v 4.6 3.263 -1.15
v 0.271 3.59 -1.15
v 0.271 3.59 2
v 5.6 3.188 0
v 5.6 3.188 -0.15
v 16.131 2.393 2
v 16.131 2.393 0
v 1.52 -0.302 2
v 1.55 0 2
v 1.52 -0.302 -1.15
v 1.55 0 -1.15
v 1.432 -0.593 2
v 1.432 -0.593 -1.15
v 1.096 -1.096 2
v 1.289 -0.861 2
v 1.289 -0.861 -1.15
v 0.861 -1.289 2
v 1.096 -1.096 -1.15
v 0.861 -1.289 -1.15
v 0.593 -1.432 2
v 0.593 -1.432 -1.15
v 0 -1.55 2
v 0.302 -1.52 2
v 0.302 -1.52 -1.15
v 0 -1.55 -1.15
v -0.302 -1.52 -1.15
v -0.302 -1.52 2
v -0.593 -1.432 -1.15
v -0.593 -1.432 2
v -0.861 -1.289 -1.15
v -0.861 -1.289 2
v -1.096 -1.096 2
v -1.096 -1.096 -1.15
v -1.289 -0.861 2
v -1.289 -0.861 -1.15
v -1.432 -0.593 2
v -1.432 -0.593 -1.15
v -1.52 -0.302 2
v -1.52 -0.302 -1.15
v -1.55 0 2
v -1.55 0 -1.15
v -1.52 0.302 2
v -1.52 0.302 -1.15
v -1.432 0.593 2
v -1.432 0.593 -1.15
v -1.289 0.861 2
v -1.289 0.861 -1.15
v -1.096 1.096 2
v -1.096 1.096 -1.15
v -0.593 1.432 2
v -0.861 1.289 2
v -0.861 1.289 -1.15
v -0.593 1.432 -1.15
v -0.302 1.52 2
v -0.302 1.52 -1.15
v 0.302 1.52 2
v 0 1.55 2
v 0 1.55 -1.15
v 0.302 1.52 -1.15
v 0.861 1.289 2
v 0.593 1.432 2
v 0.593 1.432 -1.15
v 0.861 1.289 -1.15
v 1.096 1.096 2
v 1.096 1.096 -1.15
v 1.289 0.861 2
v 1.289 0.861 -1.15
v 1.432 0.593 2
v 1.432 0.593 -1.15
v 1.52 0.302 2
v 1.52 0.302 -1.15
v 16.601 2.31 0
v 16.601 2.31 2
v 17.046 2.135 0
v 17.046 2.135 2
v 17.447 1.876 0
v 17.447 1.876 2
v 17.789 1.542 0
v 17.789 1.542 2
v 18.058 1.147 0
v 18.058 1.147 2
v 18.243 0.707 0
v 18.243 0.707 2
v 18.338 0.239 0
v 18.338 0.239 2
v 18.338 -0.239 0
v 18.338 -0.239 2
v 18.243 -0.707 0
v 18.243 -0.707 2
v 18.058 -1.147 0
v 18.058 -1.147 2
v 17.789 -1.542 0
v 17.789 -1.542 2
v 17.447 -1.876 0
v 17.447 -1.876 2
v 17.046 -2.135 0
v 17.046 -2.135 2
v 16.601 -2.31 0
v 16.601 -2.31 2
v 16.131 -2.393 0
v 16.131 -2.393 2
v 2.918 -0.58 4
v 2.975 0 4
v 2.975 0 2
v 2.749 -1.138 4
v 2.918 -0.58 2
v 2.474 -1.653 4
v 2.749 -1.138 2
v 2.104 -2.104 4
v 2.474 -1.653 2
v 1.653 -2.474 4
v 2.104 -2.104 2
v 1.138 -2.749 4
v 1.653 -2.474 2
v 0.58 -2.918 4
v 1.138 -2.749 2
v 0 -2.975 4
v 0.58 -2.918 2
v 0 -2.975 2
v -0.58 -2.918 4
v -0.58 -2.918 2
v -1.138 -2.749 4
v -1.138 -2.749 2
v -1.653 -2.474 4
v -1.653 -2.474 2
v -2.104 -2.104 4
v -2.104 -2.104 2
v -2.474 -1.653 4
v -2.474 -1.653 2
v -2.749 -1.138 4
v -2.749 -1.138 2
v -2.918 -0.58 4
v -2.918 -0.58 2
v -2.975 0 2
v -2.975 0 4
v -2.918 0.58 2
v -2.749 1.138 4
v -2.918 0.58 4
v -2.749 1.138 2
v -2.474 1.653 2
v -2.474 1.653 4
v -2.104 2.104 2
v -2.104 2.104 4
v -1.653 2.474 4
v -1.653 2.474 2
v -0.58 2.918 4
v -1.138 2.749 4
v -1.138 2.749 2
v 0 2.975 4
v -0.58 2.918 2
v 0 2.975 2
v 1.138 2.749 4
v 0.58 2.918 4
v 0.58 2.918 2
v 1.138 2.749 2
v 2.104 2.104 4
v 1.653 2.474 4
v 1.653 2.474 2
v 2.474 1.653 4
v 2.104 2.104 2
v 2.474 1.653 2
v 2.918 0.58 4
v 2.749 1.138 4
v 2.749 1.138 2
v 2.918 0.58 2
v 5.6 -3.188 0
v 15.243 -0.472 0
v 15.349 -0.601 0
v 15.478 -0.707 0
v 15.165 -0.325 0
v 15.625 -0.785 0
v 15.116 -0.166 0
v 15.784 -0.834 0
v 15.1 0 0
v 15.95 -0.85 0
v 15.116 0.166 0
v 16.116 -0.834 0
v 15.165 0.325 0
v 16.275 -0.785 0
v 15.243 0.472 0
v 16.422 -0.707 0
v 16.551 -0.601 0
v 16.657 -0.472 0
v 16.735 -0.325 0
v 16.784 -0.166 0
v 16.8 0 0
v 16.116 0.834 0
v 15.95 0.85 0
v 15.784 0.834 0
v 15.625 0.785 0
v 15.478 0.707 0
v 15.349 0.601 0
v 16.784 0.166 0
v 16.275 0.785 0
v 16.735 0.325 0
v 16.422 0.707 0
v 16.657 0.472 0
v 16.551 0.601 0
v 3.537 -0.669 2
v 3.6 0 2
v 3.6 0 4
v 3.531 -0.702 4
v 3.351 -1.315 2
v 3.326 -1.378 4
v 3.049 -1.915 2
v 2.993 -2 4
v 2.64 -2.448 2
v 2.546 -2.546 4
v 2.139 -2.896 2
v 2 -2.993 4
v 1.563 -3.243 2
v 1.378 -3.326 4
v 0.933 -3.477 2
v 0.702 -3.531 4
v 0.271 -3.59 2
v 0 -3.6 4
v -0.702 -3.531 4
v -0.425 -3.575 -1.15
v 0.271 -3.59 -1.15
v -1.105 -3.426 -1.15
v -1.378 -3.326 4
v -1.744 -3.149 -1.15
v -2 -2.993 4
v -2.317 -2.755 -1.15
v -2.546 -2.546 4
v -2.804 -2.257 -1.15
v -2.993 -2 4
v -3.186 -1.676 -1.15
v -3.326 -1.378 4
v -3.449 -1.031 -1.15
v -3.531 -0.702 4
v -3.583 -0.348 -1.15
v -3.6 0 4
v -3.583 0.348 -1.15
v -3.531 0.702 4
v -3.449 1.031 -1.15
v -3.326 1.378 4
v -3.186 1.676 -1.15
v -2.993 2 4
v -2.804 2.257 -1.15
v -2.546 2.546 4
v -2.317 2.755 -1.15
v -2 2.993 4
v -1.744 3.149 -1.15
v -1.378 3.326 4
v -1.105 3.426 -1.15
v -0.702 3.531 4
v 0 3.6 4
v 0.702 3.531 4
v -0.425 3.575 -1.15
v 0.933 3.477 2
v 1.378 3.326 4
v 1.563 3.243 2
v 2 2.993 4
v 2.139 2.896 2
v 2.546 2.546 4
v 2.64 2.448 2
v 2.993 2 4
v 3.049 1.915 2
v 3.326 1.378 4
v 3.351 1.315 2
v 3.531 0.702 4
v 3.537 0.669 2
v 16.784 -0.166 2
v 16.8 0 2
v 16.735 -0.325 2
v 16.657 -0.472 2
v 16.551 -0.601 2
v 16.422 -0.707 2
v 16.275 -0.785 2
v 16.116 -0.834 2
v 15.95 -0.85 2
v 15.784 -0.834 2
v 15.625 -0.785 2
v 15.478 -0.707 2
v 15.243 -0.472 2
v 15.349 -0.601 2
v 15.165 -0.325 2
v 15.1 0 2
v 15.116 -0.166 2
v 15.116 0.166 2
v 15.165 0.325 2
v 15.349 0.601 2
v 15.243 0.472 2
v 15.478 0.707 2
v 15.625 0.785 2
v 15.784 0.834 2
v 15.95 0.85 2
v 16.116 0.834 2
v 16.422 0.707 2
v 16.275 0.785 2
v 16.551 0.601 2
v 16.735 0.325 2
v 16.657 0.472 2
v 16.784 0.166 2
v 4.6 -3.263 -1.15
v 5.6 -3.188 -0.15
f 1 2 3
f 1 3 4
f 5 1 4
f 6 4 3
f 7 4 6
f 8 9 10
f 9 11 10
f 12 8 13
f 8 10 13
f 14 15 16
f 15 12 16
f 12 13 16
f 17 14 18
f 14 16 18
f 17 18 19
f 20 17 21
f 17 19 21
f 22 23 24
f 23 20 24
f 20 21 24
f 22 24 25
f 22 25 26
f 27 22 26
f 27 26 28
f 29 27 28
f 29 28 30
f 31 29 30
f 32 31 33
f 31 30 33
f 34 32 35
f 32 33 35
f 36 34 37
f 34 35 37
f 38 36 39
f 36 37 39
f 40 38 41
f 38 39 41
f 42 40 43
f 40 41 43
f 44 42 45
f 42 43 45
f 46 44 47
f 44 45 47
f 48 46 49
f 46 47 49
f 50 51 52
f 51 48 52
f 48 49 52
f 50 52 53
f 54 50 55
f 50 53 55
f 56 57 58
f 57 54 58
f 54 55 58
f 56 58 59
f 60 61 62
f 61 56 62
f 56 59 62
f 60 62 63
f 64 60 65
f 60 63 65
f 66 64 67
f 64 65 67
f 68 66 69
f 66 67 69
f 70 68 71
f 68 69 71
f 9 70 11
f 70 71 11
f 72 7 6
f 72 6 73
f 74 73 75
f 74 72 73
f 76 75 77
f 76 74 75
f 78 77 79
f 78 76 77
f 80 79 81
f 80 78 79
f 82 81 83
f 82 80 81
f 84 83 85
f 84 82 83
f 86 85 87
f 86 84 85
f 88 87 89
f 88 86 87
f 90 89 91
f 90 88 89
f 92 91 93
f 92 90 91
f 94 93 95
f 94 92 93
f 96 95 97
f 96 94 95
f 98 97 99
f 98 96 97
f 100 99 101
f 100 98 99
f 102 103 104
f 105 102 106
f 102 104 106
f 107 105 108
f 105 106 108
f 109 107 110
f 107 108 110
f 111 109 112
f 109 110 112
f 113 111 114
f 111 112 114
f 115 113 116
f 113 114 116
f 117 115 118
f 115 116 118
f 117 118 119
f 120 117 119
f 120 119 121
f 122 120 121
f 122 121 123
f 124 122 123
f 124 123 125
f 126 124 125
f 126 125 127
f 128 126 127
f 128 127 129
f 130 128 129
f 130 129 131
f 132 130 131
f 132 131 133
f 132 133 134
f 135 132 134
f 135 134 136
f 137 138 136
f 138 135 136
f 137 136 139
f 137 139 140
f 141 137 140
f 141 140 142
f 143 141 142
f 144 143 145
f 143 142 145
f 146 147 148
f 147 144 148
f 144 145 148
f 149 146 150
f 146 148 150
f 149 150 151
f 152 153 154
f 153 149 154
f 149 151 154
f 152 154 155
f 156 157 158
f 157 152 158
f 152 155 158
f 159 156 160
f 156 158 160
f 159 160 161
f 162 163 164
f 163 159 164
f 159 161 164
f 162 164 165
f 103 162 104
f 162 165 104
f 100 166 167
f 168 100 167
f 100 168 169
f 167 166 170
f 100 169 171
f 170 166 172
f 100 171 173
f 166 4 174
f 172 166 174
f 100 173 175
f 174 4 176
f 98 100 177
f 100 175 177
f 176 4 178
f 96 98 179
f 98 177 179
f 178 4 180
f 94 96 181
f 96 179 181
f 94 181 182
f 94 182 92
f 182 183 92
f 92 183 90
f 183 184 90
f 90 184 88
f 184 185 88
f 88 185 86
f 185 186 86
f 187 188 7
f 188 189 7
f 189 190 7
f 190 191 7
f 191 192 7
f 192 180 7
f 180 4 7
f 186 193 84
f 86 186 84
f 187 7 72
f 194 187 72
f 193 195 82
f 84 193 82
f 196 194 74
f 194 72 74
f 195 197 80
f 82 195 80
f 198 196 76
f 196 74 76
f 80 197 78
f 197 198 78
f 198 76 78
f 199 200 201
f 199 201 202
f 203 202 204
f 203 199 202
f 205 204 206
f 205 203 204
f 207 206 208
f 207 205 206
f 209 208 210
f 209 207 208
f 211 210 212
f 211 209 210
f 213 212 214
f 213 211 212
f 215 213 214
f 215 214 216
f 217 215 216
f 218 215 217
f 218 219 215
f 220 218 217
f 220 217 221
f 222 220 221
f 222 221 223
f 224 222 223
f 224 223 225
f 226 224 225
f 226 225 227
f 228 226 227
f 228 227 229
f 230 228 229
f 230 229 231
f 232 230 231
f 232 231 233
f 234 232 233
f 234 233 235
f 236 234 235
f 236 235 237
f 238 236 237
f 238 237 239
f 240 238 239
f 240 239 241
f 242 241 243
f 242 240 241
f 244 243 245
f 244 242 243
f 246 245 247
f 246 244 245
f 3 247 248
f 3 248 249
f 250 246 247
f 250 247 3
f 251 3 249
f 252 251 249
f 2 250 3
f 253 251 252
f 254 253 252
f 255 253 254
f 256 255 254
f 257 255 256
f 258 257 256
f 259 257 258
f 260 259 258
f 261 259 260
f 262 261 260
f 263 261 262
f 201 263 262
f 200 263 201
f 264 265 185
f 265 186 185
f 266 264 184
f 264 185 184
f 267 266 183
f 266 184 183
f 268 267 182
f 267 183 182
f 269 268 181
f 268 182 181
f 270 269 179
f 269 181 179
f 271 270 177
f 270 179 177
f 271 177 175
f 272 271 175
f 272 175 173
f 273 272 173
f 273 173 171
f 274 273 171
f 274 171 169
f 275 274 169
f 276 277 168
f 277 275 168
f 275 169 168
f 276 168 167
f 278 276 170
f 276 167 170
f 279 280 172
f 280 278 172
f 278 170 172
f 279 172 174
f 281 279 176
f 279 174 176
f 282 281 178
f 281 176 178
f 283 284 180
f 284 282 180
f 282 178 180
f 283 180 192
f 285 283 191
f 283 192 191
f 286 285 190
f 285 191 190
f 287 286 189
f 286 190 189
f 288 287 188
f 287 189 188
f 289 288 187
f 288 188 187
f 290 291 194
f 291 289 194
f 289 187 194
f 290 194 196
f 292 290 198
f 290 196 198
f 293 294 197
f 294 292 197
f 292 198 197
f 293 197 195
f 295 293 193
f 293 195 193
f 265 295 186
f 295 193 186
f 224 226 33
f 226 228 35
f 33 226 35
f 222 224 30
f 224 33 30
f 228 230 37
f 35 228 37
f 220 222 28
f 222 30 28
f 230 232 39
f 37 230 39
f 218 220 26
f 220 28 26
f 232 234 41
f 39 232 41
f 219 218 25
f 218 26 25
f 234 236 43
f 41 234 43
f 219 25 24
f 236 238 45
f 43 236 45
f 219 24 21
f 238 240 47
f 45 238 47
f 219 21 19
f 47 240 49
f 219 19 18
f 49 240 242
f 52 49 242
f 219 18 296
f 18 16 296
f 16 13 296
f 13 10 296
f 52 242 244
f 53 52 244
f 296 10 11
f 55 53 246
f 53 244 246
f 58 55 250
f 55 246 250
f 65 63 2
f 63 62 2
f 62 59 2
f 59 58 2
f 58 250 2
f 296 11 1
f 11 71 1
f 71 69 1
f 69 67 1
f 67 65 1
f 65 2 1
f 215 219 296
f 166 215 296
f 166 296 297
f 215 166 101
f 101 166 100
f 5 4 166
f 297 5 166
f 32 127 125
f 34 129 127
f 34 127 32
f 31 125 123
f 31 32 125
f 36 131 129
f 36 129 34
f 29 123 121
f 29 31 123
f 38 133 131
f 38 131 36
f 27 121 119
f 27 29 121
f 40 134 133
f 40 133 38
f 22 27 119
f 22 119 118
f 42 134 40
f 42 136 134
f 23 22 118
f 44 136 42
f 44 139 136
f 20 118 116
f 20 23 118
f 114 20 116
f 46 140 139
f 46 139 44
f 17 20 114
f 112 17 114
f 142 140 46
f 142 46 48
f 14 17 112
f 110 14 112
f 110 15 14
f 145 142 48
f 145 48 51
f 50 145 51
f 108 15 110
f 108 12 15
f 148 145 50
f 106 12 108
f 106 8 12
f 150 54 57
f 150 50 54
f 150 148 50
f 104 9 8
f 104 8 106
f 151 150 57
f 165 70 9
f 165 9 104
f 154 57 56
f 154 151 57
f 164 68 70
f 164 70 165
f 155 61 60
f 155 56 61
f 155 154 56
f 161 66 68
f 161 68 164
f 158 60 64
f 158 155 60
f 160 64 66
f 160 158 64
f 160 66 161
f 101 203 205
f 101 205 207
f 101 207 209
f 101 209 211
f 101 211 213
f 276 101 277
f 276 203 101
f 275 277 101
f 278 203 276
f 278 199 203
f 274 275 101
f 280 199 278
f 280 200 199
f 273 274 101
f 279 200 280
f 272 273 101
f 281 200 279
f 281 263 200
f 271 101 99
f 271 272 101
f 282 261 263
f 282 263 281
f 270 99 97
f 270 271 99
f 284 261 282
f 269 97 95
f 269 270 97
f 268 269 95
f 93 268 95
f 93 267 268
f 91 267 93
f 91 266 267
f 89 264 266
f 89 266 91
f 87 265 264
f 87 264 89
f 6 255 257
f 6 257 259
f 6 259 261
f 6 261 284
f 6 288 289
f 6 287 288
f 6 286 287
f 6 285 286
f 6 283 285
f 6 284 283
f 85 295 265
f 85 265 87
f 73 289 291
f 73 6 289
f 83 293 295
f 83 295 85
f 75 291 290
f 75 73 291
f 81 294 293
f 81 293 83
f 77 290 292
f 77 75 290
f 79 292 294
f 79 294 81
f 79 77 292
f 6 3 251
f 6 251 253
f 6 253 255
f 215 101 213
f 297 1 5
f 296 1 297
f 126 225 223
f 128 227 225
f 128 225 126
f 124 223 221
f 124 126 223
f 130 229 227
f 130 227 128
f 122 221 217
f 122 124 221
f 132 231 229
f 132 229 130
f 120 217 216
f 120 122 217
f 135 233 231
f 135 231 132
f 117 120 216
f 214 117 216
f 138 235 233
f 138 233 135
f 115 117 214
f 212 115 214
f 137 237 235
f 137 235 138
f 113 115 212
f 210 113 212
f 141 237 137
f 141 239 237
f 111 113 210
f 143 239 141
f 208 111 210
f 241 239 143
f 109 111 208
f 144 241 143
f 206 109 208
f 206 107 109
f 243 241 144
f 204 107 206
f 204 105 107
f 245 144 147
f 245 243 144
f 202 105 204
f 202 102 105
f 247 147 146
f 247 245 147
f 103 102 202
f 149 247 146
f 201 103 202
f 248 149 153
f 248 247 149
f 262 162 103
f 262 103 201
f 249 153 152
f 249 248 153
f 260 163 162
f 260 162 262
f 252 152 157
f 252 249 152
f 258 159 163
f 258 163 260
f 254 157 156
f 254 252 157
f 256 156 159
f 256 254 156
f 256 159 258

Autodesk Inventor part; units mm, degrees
ref_plane "YZ Plane" through (0, 0, 0) normal (1, 0, 0) x (0, 1, 0)
ref_plane "XZ Plane" through (0, 0, 0) normal (0, 1, 0) x (-1, 0, 0)
ref_plane "XY Plane" through (0, 0, 0) normal (0, 0, 1) x (1, 0, 0)
sketch "Sketch1" plane through (0, 0, 0) normal (0, 0, 1) x (1, 0, 0)
  circle A0 centre (0, 0) radius 3.6
  line L0 (0, 0) -> (15.95, 0) construction
  circle A1 centre (15.95, 0) radius 2.4
  line L1 (0.2708, 3.5898) -> (16.1306, 2.3932)
  line L2 (0.2708, -3.5898) -> (16.1306, -2.3932)
  line L3 (5.6, 3.1877) -> (5.6, -3.1877)
  line L4 (0, 0) -> (-3.6, 0) construction
  circle A2 centre (0, 0) radius 1.55
  circle A3 centre (15.95, 0) radius 0.85
  circle A4 centre (0, 0) radius 2.975
  dimension "d0" = 7.2
  dimension "d1" = 4.8
  dimension "d2" = 15.95
  dimension "d5" = 9.2
  dimension "d6" = 3.1
  dimension "d7" = 1.7
  dimension "d10" = 5.95
extrude "Extrusion1" add sketch "Sketch1" along normal blind 2 contours A0 | A0 L1 L3 L2 | L1 A1 L2 L3 | A1 | A4
extrude "Extrusion2" add sketch "Sketch1" against normal blind 1.15 contours A0 | A0 L1 L3 L2 | A4
extrude "Extrusion3" add sketch "Sketch1" along normal blind 4 contours A0
chamfer "Chamfer1" distance 1 angle 45 1 edges at (5.6, 0, -1.15)
properties part number "HalfServoArm"
